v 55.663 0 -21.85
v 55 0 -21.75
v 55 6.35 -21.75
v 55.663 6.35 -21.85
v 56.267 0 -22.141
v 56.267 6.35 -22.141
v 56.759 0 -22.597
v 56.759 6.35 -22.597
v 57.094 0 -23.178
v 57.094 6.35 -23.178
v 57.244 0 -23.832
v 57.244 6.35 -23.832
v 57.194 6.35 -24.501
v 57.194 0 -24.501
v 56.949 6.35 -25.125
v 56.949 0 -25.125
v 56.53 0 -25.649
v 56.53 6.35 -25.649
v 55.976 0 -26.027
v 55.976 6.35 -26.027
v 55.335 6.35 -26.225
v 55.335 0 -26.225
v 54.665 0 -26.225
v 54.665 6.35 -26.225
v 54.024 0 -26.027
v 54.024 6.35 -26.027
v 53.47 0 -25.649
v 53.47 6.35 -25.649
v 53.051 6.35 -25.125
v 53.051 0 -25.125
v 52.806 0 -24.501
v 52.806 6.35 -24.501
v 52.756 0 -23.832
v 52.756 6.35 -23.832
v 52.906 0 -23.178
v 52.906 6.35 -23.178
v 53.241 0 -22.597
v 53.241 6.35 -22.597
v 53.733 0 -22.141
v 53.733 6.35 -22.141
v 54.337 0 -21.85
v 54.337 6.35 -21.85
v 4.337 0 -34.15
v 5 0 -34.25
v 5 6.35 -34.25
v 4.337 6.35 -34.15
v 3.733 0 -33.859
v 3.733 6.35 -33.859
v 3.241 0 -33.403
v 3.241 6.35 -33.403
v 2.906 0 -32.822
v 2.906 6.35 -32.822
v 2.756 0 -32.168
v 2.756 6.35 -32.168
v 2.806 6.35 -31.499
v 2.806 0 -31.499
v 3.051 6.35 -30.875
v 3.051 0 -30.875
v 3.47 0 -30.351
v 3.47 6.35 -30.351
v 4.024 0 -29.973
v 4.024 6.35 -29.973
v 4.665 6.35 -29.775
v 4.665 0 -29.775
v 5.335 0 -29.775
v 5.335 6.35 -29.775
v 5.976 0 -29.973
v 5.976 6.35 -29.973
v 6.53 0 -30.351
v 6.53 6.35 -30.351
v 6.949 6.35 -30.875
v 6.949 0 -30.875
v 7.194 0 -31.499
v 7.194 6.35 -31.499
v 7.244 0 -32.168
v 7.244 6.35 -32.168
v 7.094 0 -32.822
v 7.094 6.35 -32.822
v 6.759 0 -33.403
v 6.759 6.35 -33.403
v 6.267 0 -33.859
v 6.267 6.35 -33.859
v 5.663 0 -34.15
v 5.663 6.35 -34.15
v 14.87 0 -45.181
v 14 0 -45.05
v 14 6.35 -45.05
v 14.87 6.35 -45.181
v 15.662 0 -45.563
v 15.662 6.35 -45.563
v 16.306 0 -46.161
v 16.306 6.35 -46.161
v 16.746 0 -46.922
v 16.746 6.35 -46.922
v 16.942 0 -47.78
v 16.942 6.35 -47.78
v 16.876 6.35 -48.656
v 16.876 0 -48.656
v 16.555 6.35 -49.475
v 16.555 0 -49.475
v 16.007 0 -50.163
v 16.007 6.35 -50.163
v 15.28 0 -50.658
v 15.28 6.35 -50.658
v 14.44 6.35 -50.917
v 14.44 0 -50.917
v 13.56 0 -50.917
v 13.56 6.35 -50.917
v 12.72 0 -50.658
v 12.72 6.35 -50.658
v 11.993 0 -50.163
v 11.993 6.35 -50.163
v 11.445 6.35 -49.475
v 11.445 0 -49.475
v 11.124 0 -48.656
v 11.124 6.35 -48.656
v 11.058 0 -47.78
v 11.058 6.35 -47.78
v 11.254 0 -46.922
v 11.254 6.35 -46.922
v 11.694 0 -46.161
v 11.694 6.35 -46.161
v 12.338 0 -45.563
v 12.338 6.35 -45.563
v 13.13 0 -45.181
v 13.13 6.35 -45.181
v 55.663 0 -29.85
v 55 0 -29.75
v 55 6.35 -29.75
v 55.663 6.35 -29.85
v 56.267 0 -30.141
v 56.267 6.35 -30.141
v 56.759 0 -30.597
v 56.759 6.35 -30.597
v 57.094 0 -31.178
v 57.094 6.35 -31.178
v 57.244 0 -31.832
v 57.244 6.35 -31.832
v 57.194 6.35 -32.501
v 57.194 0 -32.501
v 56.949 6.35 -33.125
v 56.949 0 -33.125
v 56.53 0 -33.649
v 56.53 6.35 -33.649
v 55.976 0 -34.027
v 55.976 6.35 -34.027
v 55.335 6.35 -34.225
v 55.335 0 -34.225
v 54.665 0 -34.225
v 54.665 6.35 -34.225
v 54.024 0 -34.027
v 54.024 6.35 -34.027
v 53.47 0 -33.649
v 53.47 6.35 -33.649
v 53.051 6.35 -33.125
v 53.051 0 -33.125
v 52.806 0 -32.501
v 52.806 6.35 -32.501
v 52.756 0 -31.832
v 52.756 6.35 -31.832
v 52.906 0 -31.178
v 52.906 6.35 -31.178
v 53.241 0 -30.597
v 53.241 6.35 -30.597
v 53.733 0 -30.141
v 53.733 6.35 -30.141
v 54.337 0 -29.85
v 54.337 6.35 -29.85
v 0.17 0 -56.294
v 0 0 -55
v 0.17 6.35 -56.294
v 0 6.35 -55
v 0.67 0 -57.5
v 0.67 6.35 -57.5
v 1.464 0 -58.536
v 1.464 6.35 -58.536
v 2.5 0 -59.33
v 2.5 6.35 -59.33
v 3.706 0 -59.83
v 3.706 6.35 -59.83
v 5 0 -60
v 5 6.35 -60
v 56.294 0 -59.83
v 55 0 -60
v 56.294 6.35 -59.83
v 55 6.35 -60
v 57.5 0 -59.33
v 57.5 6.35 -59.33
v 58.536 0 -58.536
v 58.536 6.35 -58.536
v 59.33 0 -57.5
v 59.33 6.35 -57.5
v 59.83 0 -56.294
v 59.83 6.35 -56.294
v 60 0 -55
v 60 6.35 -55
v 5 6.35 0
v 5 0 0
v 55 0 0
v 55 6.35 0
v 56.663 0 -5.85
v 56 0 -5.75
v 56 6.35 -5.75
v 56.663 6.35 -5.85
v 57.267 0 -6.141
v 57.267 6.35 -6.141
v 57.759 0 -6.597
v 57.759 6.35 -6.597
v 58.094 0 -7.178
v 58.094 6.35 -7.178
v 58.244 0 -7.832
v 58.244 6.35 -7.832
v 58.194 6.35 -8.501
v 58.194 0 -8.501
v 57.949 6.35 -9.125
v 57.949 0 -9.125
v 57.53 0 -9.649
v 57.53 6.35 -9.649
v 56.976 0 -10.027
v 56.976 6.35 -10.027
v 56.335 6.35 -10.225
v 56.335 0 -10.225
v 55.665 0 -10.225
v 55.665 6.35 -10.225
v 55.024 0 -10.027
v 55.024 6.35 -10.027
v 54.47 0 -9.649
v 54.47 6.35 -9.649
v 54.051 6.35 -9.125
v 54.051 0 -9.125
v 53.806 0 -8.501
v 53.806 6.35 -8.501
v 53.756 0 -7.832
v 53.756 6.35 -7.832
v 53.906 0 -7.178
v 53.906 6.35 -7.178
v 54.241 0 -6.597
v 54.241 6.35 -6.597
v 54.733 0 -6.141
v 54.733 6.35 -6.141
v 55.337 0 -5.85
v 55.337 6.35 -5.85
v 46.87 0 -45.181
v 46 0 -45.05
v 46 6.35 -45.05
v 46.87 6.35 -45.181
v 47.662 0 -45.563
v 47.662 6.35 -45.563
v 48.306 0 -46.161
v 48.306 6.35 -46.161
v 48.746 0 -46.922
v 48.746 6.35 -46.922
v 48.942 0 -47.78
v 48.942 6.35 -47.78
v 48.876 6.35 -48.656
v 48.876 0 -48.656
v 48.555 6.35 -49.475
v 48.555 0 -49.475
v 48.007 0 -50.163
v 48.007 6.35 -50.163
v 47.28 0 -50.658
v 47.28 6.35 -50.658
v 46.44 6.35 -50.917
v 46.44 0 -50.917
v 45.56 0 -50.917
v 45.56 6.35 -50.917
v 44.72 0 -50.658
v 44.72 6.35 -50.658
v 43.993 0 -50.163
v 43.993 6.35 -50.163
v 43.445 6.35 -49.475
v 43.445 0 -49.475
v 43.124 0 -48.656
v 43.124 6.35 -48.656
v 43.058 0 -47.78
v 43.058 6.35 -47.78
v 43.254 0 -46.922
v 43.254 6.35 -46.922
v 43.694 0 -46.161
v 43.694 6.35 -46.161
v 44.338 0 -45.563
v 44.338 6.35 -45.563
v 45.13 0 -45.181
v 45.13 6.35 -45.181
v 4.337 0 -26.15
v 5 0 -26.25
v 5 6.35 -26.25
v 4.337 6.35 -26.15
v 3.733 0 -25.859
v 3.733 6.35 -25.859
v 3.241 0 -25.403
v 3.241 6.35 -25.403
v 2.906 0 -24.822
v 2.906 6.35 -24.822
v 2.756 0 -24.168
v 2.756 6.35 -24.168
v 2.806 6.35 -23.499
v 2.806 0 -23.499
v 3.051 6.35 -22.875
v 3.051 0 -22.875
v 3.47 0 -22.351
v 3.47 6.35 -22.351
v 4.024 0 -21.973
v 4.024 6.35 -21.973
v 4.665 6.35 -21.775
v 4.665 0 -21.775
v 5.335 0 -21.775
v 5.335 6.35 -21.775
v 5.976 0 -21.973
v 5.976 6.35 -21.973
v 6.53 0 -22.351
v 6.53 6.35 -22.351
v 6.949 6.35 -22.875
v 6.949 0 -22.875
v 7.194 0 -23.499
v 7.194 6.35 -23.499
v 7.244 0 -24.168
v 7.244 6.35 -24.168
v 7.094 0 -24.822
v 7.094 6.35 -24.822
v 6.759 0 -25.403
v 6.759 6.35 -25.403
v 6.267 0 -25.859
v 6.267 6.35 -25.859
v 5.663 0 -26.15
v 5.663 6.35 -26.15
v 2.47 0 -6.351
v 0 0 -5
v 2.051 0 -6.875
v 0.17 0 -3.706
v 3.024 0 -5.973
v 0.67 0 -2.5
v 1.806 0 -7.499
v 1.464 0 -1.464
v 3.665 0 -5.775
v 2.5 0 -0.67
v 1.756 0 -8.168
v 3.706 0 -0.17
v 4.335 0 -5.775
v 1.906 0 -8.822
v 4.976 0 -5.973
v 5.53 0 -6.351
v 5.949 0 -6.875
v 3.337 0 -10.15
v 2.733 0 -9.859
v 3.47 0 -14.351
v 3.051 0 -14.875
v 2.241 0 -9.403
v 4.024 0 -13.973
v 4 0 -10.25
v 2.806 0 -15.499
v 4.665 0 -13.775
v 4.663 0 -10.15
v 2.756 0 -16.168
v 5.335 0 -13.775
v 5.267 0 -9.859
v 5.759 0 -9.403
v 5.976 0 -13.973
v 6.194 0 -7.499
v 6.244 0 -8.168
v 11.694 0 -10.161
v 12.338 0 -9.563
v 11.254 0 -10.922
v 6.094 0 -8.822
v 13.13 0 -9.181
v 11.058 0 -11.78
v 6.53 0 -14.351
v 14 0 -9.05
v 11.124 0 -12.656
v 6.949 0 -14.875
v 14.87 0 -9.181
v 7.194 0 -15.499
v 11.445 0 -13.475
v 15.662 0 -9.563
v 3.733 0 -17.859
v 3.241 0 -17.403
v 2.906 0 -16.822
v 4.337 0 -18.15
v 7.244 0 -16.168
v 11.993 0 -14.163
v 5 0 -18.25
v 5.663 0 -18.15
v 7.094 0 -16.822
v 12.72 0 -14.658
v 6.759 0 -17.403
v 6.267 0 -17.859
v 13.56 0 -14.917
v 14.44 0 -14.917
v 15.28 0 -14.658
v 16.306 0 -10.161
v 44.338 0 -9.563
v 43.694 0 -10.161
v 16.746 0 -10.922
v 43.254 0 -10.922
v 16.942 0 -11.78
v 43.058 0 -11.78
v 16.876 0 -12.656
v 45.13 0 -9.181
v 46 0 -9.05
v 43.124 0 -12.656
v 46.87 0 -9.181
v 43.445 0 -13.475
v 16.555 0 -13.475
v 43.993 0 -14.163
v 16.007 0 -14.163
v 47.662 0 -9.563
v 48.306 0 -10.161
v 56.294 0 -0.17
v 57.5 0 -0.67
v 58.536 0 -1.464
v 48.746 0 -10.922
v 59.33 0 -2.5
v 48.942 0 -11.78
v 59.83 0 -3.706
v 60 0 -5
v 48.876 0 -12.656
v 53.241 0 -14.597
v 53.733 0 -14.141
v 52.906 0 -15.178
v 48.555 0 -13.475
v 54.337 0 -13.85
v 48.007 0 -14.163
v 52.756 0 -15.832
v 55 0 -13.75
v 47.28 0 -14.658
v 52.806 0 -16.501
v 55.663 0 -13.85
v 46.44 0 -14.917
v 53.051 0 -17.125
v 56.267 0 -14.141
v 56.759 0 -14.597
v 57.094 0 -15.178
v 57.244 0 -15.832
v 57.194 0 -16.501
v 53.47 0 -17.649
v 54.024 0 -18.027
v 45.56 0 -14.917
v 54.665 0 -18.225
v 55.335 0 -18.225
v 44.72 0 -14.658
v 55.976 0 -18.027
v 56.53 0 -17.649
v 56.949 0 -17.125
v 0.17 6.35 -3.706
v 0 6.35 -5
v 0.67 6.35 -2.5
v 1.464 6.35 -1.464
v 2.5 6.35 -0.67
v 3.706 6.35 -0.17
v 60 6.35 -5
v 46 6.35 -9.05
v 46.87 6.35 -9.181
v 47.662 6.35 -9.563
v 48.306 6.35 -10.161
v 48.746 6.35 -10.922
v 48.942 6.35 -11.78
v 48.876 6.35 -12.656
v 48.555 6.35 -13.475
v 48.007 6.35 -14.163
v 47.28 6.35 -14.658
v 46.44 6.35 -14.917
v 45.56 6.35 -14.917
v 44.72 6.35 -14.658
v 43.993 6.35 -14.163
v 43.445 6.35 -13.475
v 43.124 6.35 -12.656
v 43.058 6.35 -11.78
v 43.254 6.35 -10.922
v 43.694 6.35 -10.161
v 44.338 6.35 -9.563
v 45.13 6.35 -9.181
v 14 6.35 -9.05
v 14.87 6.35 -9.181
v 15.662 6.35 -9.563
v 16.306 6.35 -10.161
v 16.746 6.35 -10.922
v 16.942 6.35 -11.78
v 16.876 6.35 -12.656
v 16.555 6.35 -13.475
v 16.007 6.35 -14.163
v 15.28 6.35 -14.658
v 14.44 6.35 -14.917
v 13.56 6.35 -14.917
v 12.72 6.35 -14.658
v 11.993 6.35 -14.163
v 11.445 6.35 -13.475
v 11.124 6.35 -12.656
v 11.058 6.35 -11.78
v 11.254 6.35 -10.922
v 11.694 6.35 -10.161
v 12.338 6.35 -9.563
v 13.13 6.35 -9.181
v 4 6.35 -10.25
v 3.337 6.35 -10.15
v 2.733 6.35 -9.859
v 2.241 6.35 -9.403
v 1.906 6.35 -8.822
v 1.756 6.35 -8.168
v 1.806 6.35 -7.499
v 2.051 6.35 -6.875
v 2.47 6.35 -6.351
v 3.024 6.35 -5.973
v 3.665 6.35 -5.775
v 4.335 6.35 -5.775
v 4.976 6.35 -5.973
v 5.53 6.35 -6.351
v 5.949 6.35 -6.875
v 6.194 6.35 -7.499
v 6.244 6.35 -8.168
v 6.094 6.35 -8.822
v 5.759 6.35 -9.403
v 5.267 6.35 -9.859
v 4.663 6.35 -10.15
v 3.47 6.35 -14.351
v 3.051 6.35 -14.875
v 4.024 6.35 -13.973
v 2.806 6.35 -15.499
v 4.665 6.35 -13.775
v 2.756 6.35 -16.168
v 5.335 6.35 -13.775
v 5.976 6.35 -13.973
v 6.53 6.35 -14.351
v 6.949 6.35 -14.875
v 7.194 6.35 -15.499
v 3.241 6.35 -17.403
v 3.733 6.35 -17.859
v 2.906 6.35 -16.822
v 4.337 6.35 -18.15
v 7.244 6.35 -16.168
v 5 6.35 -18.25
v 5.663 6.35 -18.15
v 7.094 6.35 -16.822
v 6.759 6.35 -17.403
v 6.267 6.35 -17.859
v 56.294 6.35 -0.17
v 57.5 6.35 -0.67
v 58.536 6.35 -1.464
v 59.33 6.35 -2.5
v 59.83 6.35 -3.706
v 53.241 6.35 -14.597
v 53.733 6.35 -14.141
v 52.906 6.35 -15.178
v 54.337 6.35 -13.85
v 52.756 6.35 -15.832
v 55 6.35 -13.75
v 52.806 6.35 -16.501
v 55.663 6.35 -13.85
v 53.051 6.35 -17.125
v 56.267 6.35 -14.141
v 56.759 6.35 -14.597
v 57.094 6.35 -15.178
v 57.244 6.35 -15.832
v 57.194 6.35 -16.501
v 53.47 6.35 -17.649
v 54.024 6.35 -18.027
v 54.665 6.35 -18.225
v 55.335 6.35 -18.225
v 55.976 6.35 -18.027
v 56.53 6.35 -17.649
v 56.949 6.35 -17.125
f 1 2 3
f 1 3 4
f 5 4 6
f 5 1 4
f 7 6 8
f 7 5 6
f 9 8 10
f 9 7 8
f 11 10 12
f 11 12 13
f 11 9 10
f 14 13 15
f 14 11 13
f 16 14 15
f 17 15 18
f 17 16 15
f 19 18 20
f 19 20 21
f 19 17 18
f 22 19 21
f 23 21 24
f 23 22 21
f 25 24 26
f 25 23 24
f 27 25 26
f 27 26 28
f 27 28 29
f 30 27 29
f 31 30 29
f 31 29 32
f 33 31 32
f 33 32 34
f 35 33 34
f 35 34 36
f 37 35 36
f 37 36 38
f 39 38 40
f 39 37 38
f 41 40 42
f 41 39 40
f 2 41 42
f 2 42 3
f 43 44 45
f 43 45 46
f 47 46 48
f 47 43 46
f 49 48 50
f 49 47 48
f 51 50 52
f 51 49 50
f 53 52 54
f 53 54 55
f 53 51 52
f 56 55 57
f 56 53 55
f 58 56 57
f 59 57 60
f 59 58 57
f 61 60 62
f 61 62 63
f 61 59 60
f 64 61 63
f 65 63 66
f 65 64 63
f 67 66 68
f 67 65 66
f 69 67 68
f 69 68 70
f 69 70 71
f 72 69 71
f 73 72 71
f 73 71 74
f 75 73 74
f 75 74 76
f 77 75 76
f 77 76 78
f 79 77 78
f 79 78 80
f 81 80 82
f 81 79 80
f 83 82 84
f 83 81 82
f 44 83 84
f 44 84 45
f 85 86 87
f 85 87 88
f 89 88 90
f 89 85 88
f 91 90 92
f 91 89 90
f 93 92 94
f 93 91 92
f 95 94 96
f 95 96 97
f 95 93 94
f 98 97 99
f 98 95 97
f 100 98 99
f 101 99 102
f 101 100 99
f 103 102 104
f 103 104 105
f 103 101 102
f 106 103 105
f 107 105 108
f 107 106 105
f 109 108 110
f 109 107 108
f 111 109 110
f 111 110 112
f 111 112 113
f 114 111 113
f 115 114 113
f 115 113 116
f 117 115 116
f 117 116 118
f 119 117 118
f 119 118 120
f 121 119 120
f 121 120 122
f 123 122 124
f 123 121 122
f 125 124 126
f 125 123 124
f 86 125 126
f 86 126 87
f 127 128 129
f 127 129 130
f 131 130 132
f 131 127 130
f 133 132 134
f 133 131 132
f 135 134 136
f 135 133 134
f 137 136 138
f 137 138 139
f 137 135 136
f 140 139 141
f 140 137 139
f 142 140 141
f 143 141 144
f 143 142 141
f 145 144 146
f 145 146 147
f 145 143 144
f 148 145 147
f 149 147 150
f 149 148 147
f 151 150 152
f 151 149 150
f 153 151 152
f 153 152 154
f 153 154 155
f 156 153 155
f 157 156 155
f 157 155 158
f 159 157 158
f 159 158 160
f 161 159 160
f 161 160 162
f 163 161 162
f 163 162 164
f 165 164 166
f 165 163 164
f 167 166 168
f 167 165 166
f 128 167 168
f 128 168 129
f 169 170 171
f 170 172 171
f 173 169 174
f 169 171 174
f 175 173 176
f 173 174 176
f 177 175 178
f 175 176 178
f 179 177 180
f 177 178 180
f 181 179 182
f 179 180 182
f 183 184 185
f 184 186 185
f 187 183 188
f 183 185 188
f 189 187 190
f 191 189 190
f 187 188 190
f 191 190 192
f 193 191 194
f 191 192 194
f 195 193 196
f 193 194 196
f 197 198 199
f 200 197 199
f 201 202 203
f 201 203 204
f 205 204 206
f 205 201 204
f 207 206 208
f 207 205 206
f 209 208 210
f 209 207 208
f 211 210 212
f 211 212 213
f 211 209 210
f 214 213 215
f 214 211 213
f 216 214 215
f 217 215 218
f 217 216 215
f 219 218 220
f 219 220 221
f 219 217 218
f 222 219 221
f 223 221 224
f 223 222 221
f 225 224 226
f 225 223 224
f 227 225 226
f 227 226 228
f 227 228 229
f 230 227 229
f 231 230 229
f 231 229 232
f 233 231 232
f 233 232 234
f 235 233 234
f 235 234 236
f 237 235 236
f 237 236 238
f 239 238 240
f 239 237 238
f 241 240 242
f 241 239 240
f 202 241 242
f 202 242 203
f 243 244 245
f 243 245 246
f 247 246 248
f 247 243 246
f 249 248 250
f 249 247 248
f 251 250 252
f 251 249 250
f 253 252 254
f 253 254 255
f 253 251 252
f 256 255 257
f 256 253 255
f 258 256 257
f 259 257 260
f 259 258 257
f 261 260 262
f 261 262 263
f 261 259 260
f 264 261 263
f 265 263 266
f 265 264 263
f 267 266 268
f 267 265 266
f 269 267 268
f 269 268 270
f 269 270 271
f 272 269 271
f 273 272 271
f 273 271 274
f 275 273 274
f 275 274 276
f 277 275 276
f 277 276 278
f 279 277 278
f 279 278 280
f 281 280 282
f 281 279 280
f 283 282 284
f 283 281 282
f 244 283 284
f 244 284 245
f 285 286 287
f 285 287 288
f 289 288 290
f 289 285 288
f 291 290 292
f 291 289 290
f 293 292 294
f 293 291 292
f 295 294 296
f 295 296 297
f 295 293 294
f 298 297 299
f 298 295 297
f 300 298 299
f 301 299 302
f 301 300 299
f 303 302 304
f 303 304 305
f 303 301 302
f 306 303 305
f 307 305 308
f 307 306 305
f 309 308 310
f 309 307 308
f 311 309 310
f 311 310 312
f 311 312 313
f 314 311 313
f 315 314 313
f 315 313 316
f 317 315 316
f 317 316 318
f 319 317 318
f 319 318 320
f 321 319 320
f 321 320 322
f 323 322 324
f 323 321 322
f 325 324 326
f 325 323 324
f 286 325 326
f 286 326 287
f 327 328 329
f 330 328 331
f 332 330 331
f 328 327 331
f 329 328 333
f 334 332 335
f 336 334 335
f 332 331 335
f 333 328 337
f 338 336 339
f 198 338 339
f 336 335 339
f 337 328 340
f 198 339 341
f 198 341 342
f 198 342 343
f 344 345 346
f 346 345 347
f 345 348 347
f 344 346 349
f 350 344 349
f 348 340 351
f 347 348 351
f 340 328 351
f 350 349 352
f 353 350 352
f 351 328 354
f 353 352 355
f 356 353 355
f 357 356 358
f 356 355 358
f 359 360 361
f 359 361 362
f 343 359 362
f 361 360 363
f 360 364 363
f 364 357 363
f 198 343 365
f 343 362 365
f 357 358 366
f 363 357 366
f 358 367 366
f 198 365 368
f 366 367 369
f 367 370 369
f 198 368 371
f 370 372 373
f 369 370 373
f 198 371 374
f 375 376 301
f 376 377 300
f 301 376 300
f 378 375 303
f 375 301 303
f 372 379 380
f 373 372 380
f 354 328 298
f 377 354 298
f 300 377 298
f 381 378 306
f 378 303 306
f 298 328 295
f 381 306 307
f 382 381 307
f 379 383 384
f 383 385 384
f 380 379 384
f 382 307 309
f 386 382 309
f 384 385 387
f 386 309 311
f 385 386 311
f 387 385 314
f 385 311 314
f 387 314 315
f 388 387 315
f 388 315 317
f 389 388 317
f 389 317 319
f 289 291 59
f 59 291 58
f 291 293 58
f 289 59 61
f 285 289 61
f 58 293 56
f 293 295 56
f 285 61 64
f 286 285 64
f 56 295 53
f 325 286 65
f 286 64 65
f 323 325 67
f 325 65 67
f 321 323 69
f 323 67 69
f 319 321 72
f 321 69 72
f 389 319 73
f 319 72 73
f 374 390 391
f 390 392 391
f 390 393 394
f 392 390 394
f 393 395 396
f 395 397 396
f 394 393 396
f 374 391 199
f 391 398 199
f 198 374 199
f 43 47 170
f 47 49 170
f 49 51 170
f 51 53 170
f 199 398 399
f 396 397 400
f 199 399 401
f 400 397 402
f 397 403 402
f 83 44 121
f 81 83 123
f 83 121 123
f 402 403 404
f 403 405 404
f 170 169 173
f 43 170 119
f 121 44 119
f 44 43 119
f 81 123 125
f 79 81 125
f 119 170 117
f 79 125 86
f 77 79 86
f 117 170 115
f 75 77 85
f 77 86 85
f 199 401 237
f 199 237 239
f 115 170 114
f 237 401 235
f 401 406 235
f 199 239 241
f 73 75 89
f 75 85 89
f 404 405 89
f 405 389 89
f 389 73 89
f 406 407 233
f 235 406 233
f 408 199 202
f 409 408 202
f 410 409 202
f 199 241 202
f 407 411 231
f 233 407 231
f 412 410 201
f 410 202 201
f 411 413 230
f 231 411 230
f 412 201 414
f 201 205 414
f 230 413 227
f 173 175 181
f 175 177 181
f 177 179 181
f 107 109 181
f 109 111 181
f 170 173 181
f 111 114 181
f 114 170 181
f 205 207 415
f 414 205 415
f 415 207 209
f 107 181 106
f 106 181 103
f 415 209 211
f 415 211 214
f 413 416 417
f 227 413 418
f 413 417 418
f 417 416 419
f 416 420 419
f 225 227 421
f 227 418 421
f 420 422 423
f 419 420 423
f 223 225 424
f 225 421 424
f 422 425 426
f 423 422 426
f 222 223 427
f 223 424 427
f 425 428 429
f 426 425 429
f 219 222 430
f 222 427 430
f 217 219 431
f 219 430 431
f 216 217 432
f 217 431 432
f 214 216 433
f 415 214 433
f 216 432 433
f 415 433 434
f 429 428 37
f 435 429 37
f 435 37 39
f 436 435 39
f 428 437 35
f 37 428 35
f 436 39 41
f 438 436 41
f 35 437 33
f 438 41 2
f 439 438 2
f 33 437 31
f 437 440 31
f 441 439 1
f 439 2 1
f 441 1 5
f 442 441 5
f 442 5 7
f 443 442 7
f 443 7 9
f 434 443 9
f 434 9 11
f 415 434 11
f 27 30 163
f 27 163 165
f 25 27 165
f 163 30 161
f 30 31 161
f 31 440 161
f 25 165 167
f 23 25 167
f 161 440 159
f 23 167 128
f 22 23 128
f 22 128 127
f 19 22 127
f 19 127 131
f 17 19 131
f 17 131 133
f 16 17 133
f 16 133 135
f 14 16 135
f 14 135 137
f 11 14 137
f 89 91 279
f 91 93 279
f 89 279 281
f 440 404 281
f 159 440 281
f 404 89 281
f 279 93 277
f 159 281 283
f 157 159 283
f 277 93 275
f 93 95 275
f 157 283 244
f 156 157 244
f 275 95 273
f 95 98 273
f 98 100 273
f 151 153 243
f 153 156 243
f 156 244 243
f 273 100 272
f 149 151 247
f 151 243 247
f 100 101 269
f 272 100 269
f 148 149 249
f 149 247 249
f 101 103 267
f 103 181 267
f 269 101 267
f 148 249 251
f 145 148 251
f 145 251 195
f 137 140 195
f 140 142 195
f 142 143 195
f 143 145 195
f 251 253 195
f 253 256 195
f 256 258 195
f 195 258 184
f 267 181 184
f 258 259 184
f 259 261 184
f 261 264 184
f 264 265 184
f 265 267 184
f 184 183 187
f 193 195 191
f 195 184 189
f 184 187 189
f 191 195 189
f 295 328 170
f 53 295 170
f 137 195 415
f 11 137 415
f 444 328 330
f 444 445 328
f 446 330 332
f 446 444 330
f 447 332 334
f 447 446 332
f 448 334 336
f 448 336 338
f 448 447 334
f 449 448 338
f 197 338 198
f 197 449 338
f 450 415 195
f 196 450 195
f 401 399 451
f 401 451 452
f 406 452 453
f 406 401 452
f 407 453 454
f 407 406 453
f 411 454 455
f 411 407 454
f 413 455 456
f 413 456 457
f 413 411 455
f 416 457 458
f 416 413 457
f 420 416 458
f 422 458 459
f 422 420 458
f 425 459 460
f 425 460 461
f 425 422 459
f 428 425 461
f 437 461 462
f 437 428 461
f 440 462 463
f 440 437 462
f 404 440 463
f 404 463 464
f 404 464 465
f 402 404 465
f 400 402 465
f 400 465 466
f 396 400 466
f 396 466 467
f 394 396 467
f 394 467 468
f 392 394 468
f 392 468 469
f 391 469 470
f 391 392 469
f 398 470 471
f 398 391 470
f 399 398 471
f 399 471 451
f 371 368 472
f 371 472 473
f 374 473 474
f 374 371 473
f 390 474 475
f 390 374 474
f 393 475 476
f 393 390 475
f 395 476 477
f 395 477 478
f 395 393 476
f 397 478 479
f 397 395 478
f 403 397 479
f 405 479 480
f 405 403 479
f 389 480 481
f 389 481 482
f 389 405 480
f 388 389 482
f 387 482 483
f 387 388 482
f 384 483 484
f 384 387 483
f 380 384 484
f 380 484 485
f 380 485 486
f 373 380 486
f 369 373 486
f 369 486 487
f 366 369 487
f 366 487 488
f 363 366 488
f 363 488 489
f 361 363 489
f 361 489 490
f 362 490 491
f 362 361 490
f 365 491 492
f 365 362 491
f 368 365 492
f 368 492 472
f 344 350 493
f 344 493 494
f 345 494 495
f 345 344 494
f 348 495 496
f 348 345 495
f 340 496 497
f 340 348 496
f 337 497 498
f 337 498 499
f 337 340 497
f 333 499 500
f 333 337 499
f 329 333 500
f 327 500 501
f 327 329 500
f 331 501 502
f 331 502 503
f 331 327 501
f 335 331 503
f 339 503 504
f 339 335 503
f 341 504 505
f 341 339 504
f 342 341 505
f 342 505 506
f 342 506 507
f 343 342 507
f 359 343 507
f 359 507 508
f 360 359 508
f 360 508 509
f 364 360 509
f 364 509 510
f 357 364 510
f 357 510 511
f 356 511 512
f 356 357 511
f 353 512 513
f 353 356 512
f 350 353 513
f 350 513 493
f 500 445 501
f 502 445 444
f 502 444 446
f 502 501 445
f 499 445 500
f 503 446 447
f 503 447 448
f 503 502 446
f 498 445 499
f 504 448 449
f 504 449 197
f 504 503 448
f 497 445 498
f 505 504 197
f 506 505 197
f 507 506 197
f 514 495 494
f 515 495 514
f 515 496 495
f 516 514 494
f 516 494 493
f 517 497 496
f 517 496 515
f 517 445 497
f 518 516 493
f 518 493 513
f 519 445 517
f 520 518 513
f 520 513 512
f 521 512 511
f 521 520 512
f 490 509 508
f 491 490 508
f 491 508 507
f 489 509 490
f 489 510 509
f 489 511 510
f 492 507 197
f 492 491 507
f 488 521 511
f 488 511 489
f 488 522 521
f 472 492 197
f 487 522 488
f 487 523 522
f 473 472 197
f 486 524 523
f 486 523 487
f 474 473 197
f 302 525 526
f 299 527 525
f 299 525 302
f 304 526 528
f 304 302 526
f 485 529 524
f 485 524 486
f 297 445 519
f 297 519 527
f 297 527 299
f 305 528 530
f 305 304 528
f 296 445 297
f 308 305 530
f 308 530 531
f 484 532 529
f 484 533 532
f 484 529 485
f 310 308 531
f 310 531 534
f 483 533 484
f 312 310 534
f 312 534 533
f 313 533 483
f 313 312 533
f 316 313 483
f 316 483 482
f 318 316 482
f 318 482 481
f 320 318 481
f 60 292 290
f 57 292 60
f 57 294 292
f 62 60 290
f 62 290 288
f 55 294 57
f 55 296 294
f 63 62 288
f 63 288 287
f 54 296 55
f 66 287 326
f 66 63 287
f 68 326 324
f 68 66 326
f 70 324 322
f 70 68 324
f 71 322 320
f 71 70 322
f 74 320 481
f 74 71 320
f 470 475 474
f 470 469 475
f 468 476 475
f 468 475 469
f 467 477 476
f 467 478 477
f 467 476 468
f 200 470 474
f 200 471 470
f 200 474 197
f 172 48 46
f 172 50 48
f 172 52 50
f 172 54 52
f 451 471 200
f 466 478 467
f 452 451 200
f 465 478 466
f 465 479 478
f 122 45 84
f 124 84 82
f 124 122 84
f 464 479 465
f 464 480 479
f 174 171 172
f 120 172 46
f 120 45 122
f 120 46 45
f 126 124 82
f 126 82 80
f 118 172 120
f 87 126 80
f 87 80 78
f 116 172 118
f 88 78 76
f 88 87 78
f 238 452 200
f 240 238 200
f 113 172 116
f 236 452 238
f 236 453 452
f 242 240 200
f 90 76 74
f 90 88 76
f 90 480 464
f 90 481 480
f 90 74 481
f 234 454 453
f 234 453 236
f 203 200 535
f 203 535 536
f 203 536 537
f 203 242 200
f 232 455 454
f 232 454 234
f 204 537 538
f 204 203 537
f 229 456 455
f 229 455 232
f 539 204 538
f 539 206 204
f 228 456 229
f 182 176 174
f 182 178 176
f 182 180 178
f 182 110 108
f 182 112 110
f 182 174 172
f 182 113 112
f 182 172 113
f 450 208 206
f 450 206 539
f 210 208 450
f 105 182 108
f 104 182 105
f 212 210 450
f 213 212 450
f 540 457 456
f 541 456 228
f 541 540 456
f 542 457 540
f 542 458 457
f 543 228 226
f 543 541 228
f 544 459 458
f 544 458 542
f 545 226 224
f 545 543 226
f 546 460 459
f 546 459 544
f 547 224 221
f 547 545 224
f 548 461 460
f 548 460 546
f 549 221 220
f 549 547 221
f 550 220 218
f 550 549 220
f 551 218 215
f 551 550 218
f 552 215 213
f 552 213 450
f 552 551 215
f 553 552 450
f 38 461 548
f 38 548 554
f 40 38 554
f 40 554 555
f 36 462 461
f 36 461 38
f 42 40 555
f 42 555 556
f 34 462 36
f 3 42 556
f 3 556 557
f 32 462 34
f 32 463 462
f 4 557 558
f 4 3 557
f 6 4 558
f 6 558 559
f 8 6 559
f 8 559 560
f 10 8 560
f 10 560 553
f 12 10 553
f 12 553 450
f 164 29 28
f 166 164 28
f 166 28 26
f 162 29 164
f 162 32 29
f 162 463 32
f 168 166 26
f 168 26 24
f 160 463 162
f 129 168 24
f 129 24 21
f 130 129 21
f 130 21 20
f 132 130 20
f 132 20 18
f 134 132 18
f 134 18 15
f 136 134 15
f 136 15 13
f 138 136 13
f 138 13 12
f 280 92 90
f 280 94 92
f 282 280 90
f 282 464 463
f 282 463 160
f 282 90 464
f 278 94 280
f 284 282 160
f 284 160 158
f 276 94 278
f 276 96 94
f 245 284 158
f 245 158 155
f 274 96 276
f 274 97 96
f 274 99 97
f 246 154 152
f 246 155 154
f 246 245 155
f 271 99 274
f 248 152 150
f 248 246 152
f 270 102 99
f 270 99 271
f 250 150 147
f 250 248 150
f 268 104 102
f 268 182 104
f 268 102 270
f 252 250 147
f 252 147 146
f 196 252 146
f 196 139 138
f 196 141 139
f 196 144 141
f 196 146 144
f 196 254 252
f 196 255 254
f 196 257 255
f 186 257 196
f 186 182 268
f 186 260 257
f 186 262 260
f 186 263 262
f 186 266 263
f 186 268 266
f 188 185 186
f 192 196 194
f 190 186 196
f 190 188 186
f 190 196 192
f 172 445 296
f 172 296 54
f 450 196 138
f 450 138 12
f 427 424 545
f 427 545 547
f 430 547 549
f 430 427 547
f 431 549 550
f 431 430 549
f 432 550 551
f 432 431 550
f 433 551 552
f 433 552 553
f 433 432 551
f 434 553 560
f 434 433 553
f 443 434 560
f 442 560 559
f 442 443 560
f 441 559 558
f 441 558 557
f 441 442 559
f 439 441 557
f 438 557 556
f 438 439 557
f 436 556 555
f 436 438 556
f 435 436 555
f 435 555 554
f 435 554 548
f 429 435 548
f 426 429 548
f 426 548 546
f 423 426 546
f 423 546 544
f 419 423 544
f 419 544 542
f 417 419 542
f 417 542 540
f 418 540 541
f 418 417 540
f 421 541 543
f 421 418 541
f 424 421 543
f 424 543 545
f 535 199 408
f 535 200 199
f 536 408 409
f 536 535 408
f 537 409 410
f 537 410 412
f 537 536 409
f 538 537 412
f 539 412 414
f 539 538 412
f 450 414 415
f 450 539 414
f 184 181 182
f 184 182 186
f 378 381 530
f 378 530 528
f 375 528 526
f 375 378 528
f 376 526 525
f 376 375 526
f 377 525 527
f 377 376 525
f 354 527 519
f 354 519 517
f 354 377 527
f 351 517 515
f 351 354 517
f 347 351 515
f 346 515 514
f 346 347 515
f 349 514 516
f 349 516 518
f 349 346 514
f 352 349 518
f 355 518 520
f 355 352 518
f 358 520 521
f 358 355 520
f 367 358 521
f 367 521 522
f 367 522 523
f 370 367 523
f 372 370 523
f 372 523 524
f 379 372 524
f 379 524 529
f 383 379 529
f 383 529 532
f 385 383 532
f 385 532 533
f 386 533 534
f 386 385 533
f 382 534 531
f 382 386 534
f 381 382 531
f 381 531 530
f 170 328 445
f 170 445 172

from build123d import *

# Parameters (mm, degrees)
SKETCH1_W           = 60
SKETCH1_H           = 60
SKETCH1_R           = 2.95
SKETCH1_R_2         = 2.25
BOSS_EXTRUDE1_DEPTH = 6.35
FILLET1_R           = 5


with BuildPart() as part:
    # Sketch1 → Boss-Extrude1 (new body)
    with BuildSketch(Plane(origin=(0, 0, 0), x_dir=(1, 0, 0), z_dir=(0, 1, 0))):
        with Locations((30, 30)):
            Rectangle(SKETCH1_W, SKETCH1_H)
        with Locations(Location((14, 48, 0), (0, 0, 270))):
            Circle(SKETCH1_R, mode=Mode.SUBTRACT)
        with Locations(Location((46, 48, 0), (0, 0, 270))):
            Circle(SKETCH1_R, mode=Mode.SUBTRACT)
        with Locations(Location((46, 12, 0), (0, 0, 270))):
            Circle(SKETCH1_R, mode=Mode.SUBTRACT)
        with Locations(Location((14, 12, 0), (0, 0, 270))):
            Circle(SKETCH1_R, mode=Mode.SUBTRACT)
        with Locations(Location((56, 8, 0), (0, 0, 270))):
            Circle(SKETCH1_R_2, mode=Mode.SUBTRACT)
        with Locations(Location((4, 8, 0), (0, 0, 90))):
            Circle(SKETCH1_R_2, mode=Mode.SUBTRACT)
        with Locations(Location((55, 16, 0), (0, 0, 270))):
            Circle(SKETCH1_R_2, mode=Mode.SUBTRACT)
        with Locations(Location((55, 24, 0), (0, 0, 270))):
            Circle(SKETCH1_R_2, mode=Mode.SUBTRACT)
        with Locations(Location((55, 32, 0), (0, 0, 270))):
            Circle(SKETCH1_R_2, mode=Mode.SUBTRACT)
        with Locations(Location((5, 32, 0), (0, 0, 90))):
            Circle(SKETCH1_R_2, mode=Mode.SUBTRACT)
        with Locations(Location((5, 24, 0), (0, 0, 90))):
            Circle(SKETCH1_R_2, mode=Mode.SUBTRACT)
        with Locations(Location((5, 16, 0), (0, 0, 90))):
            Circle(SKETCH1_R_2, mode=Mode.SUBTRACT)
    extrude(amount=BOSS_EXTRUDE1_DEPTH)

    # Fillet1
    fillet1_edges = [part.edges().sort_by_distance(p)[0] for p in [
        (0, 3.175, -60),
        (60, 3.175, -60),
        (60, 3.175, 0),
        (0, 3.175, 0),
    ]]
    fillet(fillet1_edges, radius=FILLET1_R)


solid = part.part
